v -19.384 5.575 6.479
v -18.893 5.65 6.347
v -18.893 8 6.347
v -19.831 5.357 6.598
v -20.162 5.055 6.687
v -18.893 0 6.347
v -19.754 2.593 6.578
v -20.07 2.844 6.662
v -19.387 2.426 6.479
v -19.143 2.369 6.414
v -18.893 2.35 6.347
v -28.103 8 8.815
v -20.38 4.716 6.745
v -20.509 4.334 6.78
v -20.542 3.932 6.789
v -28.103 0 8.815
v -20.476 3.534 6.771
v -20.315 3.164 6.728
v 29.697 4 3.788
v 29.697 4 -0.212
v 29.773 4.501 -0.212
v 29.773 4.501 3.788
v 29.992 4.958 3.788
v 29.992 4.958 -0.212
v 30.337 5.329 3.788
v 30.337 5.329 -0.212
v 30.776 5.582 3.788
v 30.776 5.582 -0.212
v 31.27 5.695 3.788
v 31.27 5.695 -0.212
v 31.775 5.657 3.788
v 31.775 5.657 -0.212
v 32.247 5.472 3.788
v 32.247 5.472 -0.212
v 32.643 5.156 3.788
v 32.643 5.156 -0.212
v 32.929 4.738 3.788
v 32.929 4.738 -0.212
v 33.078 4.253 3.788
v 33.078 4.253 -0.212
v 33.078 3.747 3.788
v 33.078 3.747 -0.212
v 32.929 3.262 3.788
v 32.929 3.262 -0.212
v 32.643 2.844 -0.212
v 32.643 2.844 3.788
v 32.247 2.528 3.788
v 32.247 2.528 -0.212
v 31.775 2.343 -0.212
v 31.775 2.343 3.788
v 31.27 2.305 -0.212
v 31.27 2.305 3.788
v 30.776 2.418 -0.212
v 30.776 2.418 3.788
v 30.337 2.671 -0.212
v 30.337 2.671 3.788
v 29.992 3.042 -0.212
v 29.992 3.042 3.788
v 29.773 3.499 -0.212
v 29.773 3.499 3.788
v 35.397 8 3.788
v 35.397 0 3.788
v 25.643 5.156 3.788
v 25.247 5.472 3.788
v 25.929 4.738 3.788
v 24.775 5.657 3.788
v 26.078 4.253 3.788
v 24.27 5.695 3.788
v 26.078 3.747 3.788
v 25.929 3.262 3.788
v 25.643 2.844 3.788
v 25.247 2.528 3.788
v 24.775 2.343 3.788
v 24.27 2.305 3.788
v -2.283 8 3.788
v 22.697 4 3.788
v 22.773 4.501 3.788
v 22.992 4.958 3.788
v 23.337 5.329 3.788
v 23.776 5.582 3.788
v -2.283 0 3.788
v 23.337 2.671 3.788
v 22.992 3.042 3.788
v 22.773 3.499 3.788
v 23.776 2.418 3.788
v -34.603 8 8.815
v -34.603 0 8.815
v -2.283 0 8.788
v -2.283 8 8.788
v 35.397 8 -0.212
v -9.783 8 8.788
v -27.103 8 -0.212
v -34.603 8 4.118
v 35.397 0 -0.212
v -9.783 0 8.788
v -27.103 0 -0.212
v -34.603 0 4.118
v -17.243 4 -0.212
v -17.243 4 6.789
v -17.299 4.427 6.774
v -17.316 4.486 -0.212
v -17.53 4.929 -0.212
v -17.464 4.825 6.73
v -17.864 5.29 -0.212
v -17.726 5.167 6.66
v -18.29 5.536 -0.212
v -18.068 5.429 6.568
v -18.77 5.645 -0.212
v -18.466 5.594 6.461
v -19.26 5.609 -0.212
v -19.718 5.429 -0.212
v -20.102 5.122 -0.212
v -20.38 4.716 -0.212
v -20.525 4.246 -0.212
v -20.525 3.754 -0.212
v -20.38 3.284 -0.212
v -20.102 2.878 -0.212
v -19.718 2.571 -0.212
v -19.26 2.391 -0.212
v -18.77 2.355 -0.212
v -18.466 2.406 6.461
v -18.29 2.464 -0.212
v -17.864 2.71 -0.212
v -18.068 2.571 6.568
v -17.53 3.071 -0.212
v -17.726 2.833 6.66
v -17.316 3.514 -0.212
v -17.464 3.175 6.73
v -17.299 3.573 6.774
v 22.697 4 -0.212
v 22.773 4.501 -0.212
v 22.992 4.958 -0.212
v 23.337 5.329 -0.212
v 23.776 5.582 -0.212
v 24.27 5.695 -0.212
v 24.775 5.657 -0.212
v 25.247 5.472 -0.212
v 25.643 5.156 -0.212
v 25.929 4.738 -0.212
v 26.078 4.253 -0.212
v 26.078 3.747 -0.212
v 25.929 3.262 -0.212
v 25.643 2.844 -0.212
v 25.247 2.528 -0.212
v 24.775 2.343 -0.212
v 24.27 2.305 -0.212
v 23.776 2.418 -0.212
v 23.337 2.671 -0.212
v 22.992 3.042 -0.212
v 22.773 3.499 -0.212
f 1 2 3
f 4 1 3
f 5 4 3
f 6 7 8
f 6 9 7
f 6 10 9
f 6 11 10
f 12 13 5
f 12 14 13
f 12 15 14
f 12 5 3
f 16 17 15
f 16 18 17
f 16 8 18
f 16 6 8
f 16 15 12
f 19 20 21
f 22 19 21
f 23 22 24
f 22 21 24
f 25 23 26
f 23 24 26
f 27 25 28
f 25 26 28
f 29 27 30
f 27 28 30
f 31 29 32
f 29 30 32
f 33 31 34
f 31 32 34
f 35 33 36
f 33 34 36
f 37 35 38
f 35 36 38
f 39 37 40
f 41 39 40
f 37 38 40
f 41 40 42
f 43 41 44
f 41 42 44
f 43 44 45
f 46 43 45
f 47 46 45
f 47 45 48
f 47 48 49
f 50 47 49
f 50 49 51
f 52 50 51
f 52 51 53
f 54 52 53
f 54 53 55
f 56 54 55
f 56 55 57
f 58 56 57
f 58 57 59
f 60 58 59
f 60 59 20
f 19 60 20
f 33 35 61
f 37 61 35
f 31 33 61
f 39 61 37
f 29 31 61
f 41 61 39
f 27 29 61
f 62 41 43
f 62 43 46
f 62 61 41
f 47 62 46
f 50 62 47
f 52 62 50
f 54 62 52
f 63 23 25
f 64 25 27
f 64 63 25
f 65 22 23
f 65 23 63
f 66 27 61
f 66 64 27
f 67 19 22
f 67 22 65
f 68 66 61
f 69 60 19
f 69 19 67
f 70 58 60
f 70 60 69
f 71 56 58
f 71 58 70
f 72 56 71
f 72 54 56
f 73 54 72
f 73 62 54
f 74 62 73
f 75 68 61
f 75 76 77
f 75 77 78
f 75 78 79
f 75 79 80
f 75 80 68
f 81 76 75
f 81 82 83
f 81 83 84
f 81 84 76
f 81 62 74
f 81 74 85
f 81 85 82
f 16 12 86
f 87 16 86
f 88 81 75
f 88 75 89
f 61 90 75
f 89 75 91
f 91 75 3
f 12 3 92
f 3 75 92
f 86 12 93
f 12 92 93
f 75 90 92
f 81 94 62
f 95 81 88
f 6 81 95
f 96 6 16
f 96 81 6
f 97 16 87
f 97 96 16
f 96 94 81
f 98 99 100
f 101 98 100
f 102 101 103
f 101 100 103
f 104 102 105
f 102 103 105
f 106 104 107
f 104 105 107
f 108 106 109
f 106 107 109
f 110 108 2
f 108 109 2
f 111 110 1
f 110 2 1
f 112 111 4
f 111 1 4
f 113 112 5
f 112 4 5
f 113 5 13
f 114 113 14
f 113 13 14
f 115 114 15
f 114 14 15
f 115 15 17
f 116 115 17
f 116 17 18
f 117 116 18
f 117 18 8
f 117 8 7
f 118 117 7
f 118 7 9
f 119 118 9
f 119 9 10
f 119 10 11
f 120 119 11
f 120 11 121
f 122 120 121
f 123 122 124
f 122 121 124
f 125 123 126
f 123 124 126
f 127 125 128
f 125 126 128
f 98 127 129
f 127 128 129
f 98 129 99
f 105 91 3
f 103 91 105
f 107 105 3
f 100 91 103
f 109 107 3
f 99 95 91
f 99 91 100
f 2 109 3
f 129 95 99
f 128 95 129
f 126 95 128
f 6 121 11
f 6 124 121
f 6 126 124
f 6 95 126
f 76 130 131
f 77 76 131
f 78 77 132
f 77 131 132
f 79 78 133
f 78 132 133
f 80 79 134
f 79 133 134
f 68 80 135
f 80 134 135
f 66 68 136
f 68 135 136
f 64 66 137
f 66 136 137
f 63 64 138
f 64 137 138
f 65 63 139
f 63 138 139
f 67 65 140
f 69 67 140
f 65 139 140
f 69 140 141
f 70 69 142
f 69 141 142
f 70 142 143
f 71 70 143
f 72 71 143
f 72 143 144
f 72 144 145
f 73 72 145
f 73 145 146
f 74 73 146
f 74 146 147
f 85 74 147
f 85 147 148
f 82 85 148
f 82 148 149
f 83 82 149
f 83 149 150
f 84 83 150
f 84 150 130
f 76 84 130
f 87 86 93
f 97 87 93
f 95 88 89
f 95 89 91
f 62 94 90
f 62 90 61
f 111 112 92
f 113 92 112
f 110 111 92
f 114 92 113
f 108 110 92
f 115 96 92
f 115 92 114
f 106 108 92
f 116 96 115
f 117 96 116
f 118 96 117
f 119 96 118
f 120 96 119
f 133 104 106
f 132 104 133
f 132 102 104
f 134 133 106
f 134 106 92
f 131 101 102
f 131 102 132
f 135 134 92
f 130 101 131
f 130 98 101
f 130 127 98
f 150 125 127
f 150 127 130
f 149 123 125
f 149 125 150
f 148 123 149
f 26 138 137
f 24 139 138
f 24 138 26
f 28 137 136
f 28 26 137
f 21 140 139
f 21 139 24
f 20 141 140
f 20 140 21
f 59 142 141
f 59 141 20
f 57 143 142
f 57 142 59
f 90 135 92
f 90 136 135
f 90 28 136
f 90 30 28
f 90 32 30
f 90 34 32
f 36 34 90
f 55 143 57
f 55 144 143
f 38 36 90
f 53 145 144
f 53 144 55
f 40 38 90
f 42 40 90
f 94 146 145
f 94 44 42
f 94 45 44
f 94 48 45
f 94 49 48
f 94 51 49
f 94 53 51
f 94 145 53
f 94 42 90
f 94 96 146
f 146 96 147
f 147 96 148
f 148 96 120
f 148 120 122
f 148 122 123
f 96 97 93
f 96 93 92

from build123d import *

# Parameters (mm, degrees)
BOSS_EXTRUDE2_DEPTH   = 8
M4_TAPPED_HOLE1_D     = 3.3
M4_TAPPED_HOLE1_DEPTH = 11.5
M4_TAPPED_HOLE1_TIP   = 0.991420021
SKETCH8_R             = 1.7
CUT_EXTRUDE1_DEPTH    = 10


with BuildPart() as part:
    # Sketch1 → Boss-Extrude2 (new body)
    with BuildSketch(Plane(origin=(0, 0, 0), x_dir=(1, 0, 0), z_dir=(0, 1, 0))):
        Polygon((35.397046685, 0.212206196), (35.397046685, -3.787793804), (-2.283249607, -3.787793804), (-2.283249607, -8.787793804), (-9.783249607, -8.787793804), (-18.892613672, -6.346947059), (-28.102933344, -8.814844777), (-34.602933344, -8.814844777), (-34.602933344, -4.117707659), (-27.103302555, 0.212206196), align=None)
    extrude(amount=BOSS_EXTRUDE2_DEPTH)

    # M4 Tapped Hole1
    with Locations(Plane(origin=(0, 0, -0.212206196), x_dir=(-1, 0, 0), z_dir=(0, 0, -1))):
        with Locations((18.892933344, 4)):
            Hole(M4_TAPPED_HOLE1_D / 2, depth=M4_TAPPED_HOLE1_DEPTH)
            with Locations((0, 0, -(M4_TAPPED_HOLE1_DEPTH + M4_TAPPED_HOLE1_TIP / 2))):  # 118° drill point
                Cone(0, M4_TAPPED_HOLE1_D / 2, M4_TAPPED_HOLE1_TIP, mode=Mode.SUBTRACT)

    # Sketch8 → Cut-Extrude1 (cut)
    with BuildSketch(Plane(origin=(0, 0, -0.212206196), x_dir=(-1, 0, 0), z_dir=(0, 0, -1))):
        with Locations((-31.397046685, 4)):
            Circle(SKETCH8_R)
        with Locations((-24.397046685, 4)):
            Circle(SKETCH8_R)
    extrude(amount=-CUT_EXTRUDE1_DEPTH, mode=Mode.SUBTRACT)


solid = part.part
